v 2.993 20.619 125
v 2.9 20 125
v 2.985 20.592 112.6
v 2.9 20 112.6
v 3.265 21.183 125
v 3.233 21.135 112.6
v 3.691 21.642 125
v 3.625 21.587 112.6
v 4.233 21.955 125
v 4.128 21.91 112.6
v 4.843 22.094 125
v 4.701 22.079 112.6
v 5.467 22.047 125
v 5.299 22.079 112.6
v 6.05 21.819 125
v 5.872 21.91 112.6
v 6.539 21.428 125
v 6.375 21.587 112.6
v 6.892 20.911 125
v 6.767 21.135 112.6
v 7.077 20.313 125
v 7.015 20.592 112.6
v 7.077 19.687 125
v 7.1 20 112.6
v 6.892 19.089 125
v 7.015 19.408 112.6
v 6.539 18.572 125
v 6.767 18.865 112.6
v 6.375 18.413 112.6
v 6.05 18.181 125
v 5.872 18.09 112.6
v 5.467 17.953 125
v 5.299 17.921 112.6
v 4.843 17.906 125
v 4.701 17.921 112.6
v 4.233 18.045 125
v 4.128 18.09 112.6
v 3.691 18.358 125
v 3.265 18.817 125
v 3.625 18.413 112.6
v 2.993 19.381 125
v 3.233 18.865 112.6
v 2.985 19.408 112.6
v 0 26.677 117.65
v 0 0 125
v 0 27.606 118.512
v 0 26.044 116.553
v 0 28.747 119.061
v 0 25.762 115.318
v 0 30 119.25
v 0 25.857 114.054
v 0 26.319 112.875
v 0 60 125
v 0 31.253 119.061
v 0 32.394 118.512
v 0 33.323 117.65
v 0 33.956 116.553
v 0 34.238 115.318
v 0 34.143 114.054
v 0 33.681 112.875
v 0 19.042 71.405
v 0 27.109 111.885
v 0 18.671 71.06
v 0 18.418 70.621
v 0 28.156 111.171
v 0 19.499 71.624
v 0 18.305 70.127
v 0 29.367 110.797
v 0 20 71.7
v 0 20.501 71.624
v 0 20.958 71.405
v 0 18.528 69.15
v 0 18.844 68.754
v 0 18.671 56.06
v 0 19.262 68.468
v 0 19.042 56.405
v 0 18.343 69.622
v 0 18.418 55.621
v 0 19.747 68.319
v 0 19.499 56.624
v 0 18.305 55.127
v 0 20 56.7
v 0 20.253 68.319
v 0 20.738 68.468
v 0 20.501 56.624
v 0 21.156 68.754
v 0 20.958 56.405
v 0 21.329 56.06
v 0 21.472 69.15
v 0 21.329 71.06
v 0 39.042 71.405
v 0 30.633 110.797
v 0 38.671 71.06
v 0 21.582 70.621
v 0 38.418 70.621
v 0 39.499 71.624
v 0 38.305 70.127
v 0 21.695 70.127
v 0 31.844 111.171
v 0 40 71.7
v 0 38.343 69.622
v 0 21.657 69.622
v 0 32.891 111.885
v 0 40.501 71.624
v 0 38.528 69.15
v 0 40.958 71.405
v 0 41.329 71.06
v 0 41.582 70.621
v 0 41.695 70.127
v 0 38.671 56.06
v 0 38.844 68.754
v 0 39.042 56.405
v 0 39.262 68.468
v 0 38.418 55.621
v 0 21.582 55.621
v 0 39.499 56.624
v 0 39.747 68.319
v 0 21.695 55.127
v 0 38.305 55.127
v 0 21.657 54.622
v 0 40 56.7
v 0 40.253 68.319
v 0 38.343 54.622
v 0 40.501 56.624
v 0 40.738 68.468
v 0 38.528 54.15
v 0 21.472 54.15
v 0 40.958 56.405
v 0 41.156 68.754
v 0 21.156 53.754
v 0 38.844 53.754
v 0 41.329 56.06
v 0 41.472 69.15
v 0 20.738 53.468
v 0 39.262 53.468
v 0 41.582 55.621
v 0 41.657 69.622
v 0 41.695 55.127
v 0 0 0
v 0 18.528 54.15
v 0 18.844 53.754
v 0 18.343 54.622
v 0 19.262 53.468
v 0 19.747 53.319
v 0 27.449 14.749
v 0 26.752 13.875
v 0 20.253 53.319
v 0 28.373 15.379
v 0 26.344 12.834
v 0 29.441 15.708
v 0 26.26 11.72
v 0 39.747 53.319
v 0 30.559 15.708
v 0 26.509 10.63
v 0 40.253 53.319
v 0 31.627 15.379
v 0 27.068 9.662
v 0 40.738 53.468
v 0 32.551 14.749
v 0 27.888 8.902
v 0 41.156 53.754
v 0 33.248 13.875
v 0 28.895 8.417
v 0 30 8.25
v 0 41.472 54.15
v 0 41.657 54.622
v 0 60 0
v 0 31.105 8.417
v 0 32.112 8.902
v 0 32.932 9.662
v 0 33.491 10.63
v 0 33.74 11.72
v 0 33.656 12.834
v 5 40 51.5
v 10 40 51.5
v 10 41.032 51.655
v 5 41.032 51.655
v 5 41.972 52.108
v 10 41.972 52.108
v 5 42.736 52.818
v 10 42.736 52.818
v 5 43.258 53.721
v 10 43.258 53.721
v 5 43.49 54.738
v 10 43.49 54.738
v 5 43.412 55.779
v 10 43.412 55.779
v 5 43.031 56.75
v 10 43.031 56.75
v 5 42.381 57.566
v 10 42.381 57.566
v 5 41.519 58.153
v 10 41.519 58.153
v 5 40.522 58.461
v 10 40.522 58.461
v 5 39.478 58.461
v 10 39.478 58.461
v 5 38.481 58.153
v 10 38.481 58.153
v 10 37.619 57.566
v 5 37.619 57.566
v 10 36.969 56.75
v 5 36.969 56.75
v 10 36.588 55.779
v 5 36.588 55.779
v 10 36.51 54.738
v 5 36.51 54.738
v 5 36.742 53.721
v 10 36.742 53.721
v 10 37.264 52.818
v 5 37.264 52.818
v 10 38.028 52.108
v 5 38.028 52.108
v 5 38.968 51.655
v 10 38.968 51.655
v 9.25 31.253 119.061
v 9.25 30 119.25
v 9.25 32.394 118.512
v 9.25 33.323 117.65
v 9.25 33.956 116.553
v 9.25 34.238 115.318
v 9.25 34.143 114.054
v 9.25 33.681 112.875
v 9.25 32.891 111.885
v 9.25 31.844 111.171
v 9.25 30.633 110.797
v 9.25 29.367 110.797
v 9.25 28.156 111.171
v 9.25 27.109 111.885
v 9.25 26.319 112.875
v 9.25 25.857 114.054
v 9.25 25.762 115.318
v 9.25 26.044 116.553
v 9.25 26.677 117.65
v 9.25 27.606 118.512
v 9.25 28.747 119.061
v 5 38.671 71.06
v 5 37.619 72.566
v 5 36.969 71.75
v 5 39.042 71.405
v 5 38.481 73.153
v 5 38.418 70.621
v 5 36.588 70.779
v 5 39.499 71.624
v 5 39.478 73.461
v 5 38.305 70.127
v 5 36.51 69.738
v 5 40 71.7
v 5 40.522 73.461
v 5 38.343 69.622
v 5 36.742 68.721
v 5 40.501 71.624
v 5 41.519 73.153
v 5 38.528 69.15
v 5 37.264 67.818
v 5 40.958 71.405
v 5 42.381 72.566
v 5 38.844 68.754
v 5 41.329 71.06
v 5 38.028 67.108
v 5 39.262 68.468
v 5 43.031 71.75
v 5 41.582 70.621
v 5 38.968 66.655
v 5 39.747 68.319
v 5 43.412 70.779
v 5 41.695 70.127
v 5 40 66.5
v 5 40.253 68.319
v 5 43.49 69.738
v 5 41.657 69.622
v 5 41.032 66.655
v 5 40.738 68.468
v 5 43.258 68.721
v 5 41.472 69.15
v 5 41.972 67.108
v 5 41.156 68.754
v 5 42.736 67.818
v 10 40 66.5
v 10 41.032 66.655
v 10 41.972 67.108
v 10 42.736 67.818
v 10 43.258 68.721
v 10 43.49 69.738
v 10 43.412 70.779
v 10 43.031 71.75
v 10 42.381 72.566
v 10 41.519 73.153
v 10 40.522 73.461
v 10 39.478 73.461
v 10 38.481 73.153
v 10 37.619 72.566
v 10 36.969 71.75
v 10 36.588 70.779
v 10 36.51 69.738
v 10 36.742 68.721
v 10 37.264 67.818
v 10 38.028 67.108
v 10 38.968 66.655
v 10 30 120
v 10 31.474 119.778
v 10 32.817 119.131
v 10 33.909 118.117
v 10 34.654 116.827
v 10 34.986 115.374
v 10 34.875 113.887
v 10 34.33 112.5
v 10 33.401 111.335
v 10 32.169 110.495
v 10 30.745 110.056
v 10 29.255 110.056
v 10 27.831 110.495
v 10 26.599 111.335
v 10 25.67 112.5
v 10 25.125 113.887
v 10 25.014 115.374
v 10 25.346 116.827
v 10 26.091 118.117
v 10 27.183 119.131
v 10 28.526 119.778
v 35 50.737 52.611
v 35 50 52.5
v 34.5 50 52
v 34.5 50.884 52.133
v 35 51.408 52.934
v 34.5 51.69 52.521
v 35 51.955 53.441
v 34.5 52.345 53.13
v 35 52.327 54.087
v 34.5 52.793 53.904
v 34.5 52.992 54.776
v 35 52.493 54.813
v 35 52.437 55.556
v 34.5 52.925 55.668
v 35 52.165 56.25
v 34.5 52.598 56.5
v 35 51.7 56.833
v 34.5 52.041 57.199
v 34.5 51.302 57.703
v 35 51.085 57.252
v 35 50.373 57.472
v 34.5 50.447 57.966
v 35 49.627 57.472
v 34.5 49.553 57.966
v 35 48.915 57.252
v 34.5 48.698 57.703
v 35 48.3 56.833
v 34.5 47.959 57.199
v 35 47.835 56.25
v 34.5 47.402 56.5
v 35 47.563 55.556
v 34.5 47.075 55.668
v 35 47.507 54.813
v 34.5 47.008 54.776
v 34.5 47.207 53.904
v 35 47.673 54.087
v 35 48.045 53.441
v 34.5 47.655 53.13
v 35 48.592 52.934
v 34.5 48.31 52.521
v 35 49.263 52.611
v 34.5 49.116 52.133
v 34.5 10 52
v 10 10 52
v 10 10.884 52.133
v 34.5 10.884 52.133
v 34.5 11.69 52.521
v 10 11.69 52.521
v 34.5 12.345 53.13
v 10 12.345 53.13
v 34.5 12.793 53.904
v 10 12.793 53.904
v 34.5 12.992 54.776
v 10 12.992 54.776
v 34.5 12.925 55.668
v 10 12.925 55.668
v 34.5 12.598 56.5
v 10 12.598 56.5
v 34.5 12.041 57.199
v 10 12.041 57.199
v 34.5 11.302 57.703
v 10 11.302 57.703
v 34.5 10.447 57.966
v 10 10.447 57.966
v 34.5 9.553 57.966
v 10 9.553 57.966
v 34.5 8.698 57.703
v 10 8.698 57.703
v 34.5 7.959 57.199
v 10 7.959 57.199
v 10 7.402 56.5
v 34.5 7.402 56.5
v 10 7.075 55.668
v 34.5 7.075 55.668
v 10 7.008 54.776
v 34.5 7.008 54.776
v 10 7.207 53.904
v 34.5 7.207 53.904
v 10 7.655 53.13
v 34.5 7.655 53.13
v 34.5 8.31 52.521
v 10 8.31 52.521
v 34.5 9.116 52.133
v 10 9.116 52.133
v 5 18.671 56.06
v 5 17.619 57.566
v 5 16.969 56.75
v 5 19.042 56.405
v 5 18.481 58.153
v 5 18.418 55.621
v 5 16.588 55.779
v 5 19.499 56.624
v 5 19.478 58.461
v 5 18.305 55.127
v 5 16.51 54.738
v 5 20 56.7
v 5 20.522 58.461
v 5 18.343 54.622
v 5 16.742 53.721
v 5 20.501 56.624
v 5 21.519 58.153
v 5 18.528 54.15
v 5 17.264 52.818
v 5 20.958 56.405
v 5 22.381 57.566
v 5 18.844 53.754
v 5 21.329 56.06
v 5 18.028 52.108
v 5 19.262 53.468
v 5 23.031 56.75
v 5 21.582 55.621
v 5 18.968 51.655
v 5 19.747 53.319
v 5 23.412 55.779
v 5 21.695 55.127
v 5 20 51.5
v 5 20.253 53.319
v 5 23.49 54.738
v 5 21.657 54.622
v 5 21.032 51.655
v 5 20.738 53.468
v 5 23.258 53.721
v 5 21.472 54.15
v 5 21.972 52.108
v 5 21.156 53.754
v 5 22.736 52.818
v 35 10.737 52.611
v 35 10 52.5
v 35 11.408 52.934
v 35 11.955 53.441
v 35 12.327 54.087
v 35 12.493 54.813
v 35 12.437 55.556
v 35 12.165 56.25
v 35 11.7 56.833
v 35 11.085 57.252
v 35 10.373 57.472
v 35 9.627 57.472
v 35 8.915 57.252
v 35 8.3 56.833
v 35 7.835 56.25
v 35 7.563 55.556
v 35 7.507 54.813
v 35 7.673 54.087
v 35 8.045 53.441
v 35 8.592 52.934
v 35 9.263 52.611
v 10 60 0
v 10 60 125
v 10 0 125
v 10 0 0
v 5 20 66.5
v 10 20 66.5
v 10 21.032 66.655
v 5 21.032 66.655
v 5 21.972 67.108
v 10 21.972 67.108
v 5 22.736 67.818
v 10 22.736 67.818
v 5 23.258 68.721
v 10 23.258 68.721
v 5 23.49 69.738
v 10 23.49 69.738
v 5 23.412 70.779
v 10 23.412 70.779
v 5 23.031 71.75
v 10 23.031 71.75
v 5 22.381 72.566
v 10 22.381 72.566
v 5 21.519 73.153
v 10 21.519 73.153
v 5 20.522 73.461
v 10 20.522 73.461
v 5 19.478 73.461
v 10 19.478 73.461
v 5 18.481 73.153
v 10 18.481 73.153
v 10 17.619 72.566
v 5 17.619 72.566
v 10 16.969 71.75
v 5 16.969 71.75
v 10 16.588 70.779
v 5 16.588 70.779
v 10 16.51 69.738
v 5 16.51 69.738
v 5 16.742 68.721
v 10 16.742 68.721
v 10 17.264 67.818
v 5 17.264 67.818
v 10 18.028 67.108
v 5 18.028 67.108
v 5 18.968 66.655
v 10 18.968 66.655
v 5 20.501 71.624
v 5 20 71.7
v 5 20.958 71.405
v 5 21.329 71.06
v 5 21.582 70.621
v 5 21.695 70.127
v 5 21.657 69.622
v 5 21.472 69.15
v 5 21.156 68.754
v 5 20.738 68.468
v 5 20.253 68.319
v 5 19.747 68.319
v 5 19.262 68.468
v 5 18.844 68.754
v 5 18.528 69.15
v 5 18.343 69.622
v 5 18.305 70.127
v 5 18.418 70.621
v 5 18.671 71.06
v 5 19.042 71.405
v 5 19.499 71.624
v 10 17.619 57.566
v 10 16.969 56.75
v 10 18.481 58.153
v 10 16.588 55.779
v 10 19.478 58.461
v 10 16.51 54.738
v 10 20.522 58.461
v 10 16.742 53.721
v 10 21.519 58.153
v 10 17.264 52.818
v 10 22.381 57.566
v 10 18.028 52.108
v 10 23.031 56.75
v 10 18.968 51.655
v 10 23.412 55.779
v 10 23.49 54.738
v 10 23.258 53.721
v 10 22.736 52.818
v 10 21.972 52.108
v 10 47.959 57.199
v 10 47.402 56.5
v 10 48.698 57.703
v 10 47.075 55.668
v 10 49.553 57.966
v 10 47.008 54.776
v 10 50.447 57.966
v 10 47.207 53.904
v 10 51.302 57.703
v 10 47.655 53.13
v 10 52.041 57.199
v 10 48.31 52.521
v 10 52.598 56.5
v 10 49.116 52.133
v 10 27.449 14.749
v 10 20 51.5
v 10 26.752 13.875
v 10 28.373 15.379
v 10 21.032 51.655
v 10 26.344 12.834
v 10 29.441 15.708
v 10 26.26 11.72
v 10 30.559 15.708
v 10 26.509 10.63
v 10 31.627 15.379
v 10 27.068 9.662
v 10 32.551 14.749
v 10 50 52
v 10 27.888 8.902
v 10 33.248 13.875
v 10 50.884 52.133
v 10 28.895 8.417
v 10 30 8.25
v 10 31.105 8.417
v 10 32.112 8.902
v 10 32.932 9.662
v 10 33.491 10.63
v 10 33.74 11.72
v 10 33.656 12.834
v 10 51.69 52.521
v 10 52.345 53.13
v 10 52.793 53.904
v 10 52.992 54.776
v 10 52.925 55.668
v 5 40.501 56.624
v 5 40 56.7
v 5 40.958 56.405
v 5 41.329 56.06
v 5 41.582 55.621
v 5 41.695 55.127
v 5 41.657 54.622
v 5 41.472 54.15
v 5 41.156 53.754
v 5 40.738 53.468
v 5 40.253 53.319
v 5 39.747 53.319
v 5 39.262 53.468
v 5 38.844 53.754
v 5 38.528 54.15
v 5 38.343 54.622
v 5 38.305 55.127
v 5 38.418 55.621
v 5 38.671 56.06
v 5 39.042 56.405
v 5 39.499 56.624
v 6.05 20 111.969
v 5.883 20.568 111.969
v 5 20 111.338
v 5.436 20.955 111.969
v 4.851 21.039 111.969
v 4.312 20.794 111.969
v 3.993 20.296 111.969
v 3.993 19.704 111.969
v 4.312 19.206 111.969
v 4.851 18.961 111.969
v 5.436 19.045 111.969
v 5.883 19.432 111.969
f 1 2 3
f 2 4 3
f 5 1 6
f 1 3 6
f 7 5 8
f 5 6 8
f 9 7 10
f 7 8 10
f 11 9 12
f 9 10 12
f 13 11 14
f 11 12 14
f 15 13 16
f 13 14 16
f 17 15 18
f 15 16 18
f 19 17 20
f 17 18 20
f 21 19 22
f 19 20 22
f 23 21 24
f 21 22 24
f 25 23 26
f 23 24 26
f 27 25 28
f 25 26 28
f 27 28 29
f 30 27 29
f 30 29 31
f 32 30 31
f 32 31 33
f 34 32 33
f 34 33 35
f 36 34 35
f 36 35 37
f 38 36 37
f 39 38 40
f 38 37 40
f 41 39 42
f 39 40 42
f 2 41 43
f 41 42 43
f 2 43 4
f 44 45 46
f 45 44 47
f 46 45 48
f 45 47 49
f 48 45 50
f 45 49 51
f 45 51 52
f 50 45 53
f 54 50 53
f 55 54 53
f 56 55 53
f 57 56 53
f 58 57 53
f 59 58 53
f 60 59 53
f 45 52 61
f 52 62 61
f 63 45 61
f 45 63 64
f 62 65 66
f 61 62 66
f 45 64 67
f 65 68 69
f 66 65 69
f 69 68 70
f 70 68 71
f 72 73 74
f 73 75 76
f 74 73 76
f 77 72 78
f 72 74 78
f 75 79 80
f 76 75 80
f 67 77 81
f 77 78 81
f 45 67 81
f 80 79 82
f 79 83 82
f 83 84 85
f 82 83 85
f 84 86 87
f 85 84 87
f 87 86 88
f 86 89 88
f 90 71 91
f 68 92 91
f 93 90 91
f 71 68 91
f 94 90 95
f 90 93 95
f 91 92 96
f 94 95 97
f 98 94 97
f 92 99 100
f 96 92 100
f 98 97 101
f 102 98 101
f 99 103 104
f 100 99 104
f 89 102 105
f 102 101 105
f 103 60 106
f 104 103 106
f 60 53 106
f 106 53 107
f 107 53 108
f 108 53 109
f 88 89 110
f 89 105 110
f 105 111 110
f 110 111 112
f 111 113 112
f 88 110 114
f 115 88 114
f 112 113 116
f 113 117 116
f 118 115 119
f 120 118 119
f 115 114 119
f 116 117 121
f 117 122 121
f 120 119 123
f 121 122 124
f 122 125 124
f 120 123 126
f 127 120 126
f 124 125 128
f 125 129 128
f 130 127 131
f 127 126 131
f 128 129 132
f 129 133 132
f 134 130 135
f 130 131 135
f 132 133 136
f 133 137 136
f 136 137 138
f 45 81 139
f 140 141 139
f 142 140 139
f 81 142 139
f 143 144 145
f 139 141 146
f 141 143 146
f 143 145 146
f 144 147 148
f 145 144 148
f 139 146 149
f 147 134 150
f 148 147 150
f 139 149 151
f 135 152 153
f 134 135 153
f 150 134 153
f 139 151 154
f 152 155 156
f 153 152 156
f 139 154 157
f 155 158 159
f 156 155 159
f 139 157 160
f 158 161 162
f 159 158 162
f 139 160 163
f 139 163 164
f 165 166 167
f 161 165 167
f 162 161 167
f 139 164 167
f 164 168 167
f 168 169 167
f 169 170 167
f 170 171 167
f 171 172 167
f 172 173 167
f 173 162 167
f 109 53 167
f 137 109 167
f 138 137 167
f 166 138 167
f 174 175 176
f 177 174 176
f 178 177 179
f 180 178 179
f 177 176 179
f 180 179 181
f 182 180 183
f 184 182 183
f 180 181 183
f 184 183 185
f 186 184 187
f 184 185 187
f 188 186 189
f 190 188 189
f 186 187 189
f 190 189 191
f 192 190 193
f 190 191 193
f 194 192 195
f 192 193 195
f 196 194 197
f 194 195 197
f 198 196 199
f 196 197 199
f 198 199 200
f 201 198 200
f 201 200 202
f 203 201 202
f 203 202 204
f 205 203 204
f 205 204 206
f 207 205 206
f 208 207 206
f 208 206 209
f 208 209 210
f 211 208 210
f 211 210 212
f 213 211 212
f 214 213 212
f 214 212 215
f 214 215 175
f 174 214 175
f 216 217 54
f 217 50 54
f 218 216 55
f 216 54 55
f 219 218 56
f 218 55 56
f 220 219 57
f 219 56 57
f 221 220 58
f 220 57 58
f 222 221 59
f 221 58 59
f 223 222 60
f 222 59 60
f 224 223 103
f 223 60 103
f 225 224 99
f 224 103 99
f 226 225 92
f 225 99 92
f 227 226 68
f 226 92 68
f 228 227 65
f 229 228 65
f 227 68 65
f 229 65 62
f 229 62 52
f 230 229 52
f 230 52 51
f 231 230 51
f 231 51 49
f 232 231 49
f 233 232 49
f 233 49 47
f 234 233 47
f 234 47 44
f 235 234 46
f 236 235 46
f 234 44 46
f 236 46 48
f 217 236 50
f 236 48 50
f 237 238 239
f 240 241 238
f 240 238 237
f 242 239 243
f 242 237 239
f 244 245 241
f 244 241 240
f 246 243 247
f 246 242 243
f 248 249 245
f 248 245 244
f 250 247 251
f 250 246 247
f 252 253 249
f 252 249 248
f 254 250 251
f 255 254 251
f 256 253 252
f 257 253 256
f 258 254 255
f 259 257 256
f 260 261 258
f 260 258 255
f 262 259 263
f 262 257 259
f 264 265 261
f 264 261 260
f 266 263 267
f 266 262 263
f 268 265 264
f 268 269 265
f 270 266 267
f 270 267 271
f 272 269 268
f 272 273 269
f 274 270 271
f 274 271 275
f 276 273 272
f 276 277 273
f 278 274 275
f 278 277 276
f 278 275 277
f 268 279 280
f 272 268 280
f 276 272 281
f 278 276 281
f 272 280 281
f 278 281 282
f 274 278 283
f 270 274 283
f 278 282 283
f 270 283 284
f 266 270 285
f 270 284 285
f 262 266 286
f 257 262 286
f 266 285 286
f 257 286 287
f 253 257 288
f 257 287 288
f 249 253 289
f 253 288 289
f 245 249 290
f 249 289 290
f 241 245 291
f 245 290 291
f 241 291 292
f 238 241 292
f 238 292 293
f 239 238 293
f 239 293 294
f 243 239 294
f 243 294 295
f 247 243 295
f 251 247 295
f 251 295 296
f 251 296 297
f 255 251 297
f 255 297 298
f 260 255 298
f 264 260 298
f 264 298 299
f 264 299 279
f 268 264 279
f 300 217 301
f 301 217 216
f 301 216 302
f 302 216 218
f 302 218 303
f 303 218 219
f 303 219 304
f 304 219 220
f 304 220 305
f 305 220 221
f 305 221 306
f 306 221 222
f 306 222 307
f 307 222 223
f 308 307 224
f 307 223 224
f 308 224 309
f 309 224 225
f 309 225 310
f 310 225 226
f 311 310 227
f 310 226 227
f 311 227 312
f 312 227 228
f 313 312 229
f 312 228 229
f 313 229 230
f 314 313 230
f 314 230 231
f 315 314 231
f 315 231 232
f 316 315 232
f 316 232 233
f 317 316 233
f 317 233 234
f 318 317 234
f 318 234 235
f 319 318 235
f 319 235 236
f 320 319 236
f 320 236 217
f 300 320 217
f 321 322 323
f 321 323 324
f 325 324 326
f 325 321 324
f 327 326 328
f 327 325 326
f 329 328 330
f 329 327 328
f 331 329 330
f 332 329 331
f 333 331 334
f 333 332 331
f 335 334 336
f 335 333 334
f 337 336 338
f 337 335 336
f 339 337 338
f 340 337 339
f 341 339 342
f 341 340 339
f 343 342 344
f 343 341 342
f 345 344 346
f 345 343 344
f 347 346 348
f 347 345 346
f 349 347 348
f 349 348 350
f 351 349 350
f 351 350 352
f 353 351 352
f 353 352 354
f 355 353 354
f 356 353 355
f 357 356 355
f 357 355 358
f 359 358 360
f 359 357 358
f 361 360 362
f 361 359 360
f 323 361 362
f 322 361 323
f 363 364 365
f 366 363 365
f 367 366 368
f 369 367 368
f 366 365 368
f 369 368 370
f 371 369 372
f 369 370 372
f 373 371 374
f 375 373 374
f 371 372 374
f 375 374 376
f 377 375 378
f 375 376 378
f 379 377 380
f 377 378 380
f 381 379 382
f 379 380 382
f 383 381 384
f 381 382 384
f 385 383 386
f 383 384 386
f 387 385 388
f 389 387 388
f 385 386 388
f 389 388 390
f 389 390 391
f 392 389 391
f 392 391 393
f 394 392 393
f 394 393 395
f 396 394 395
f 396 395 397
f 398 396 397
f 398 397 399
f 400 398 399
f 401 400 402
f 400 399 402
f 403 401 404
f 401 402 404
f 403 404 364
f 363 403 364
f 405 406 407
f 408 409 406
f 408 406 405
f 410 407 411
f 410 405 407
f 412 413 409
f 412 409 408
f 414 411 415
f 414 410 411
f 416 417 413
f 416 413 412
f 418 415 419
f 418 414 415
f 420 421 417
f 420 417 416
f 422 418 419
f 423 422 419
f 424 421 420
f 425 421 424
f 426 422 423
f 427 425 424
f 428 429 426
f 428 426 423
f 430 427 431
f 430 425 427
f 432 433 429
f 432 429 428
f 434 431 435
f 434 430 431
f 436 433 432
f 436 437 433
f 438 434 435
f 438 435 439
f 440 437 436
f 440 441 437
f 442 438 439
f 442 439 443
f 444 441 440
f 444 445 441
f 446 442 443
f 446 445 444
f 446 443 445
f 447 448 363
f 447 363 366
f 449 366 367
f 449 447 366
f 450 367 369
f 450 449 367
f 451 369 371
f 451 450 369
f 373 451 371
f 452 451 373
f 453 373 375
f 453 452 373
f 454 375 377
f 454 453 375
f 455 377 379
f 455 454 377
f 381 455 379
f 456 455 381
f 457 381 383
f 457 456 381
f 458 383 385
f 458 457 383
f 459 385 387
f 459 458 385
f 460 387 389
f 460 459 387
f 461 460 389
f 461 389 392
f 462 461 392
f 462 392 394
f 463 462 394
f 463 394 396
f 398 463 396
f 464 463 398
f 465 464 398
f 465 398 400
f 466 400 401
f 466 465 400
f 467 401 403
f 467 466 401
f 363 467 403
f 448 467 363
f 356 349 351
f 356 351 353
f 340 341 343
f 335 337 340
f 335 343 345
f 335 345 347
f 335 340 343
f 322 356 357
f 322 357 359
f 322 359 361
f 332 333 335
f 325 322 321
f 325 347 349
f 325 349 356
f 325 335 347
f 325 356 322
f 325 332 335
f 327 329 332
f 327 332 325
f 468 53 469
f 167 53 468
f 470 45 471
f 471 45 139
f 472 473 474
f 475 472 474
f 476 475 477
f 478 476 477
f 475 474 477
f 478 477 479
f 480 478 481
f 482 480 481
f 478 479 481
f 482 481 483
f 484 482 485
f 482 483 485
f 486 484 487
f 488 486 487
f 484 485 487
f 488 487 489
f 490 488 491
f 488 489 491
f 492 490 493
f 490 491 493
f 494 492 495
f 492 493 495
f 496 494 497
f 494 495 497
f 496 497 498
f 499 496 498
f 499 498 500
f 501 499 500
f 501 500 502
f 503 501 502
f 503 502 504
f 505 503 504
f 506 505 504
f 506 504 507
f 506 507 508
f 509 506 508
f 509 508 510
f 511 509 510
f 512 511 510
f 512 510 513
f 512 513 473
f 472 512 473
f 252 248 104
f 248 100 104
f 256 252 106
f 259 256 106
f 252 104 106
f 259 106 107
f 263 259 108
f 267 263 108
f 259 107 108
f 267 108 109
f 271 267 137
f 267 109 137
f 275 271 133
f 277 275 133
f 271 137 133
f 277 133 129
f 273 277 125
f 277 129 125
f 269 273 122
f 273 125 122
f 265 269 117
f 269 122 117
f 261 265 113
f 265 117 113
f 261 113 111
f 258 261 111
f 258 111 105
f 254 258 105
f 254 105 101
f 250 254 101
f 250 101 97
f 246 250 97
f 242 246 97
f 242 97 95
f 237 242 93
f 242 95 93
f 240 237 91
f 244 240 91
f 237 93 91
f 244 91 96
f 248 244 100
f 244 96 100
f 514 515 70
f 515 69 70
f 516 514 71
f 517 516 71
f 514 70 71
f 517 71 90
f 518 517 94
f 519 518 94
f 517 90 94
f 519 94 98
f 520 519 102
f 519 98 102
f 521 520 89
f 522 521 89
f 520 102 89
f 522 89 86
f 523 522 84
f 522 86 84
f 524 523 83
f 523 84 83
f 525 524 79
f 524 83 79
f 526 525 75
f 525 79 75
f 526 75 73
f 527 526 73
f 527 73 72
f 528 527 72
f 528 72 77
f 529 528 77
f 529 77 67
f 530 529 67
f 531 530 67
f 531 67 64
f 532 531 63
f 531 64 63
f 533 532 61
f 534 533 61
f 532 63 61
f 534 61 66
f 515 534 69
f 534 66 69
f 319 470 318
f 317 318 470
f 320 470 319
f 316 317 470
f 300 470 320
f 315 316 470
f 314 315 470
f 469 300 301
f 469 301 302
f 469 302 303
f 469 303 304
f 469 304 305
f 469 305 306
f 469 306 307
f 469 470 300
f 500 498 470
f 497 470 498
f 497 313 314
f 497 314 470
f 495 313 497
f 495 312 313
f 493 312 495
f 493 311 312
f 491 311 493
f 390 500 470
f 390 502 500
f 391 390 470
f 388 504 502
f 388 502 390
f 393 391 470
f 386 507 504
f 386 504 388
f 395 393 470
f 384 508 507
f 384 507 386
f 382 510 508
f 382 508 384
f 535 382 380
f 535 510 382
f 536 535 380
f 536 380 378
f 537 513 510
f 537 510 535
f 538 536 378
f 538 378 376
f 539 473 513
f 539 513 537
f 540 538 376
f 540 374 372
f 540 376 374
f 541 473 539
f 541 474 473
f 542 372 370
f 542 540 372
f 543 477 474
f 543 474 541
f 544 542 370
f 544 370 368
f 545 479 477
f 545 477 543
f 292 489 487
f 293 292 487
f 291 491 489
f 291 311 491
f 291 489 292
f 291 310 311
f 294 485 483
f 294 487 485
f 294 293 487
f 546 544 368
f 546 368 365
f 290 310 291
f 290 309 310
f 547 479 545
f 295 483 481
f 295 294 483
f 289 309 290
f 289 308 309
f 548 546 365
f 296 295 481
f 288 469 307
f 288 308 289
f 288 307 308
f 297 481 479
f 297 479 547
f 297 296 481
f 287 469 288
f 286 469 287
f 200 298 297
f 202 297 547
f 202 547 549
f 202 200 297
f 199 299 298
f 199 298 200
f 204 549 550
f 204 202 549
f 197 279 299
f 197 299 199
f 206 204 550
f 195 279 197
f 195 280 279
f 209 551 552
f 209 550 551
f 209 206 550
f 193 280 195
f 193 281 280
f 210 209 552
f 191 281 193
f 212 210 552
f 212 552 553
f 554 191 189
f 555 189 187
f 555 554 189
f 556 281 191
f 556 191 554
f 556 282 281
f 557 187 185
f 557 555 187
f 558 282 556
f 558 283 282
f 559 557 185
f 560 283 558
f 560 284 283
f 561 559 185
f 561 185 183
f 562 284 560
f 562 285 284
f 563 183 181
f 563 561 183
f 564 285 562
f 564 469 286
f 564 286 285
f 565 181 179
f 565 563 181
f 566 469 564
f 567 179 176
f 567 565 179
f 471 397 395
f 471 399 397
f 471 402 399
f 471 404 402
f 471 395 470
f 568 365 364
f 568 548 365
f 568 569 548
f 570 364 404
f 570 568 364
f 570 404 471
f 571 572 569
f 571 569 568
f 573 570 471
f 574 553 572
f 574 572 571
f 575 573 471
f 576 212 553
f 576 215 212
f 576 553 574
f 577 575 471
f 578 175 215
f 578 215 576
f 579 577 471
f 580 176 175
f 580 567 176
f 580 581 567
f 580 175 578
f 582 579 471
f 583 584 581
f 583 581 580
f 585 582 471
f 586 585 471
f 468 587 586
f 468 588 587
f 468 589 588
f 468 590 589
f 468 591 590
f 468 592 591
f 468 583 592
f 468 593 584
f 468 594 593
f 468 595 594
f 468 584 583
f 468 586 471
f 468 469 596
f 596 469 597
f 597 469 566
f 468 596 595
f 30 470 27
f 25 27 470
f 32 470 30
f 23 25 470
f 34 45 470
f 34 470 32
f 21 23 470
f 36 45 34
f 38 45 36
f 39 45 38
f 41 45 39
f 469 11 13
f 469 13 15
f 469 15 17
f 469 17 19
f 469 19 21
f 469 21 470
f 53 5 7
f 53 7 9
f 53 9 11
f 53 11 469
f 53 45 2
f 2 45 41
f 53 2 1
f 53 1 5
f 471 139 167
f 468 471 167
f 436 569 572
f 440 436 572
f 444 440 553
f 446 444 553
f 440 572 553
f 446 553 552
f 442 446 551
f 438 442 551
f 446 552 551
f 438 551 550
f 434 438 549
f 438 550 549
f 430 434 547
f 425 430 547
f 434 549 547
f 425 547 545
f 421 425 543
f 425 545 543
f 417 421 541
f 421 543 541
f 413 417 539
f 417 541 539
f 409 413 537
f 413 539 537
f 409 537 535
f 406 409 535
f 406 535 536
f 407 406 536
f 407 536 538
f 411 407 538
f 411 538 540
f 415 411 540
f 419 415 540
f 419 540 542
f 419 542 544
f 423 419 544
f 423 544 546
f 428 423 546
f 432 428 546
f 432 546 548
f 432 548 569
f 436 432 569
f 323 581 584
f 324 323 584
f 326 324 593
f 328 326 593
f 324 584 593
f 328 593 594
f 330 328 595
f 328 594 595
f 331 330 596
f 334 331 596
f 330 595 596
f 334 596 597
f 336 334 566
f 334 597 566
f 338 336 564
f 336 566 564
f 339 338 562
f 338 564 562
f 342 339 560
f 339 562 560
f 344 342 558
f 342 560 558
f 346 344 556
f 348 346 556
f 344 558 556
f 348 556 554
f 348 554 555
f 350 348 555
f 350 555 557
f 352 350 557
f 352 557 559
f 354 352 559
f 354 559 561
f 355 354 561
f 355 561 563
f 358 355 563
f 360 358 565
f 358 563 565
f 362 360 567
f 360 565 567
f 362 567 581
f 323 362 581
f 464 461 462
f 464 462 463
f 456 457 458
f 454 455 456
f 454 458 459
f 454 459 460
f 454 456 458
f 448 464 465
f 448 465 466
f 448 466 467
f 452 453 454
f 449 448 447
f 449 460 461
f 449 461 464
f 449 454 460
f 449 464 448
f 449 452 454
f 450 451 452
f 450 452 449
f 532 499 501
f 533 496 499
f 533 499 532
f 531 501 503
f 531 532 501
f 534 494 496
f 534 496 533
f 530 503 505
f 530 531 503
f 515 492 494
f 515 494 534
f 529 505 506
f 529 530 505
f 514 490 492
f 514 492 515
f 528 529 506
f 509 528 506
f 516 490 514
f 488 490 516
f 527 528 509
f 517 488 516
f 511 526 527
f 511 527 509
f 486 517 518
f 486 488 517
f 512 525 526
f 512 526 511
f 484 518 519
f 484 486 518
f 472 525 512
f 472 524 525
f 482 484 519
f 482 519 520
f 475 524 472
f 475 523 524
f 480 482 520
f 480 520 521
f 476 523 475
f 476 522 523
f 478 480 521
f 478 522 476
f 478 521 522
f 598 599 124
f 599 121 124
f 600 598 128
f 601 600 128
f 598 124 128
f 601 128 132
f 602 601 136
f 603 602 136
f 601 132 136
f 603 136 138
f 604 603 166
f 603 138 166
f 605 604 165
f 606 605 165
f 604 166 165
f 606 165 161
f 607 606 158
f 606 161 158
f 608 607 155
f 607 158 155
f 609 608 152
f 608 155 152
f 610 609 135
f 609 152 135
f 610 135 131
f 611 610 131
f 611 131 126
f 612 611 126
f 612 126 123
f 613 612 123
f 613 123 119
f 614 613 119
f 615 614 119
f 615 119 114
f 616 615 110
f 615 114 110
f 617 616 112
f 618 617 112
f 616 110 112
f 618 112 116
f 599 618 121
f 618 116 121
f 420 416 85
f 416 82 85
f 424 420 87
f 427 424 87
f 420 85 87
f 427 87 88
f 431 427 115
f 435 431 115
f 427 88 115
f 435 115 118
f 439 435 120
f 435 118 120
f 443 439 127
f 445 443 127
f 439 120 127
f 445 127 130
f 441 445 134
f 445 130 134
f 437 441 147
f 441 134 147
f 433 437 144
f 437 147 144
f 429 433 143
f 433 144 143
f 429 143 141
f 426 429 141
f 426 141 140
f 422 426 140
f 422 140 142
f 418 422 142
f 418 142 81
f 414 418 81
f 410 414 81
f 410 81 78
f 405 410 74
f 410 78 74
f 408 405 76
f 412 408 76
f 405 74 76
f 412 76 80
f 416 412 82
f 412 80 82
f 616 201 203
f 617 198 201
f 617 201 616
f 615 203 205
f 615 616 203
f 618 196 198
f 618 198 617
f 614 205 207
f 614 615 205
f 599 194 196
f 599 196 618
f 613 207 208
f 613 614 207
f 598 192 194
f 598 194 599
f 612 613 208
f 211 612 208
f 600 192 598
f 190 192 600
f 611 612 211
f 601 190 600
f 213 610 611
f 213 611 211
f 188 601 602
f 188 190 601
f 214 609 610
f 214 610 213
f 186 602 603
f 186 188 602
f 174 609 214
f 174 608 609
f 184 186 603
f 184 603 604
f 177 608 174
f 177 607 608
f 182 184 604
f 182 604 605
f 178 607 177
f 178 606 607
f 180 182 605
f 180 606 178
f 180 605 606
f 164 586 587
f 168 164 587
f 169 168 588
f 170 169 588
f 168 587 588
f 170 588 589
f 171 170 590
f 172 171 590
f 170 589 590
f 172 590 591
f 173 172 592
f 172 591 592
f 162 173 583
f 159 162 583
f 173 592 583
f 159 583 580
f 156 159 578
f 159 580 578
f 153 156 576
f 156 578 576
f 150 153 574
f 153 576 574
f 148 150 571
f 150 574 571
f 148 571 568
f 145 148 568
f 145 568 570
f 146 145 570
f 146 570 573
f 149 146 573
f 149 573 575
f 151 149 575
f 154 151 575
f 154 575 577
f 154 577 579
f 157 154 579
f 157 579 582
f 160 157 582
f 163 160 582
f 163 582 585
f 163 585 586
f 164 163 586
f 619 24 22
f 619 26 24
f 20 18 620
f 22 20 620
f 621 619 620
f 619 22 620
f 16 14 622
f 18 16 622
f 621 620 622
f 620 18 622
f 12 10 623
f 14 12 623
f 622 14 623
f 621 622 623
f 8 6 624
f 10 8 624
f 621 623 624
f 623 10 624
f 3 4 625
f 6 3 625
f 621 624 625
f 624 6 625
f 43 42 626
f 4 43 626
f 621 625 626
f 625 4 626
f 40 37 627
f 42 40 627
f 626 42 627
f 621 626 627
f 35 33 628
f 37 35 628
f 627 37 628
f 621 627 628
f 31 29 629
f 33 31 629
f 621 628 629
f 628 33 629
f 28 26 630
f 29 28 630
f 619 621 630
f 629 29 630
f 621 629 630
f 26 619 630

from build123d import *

# Parameters (mm, degrees)
SKETCH1_W                                           = 125
SKETCH1_H                                           = 60
BOSS_EXTRUDE1_DEPTH                                 = 10
SKETCH12_R                                          = 3
BOSS_EXTRUDE2_DEPTH                                 = 25
M10_TAPPED_HOLE1_D                                  = 8.5
M10_TAPPED_HOLE1_DEPTH                              = 24.5
M10_TAPPED_HOLE1_CSINK_D                            = 10
M10_TAPPED_HOLE1_CSINK_ANGLE                        = 90
M10_TAPPED_HOLE1_TIP                                = 2.553657631
SKETCH7_R                                           = 3.75
CUT_EXTRUDE1_DEPTH                                  = 141.890028036
CBORE_FOR_M3_HEX_SOCKET_HEAD_CAP_SCREW1_D           = 3.4
CBORE_FOR_M3_HEX_SOCKET_HEAD_CAP_SCREW1_CBORE_D     = 7
CBORE_FOR_M3_HEX_SOCKET_HEAD_CAP_SCREW1_CBORE_DEPTH = 5
M5_TAPPED_HOLE1_D                                   = 4.2
M5_TAPPED_HOLE1_DEPTH                               = 12.4
M5_TAPPED_HOLE1_TIP                                 = 1.2618073
CHAMFER2_SIZE                                       = 0.5


with BuildPart() as part:
    # Sketch1 → Boss-Extrude1 (new body)
    with BuildSketch(Plane(origin=(0, 0, 0), x_dir=(0, 0, -1), z_dir=(1, 0, 0))):
        with Locations((-62.5, 30)):
            Rectangle(SKETCH1_W, SKETCH1_H)
    extrude(amount=BOSS_EXTRUDE1_DEPTH)

    # Sketch12 → Boss-Extrude2 (add)
    with BuildSketch(Plane(origin=(10, 0, 0), x_dir=(0, 0, -1), z_dir=(1, 0, 0))):
        with Locations((-55, 10)):
            Circle(SKETCH12_R)
        with Locations((-55, 50)):
            Circle(SKETCH12_R)
    extrude(amount=BOSS_EXTRUDE2_DEPTH)

    # M10 Tapped Hole1
    with Locations(Plane(origin=(10, 0, 0), x_dir=(0, 0, -1), z_dir=(1, 0, 0))):
        with Locations((-115, 30)):
            CounterSinkHole(M10_TAPPED_HOLE1_D / 2, M10_TAPPED_HOLE1_CSINK_D / 2, depth=M10_TAPPED_HOLE1_DEPTH, counter_sink_angle=M10_TAPPED_HOLE1_CSINK_ANGLE)
            with Locations((0, 0, -(M10_TAPPED_HOLE1_DEPTH + M10_TAPPED_HOLE1_TIP / 2))):  # 118° drill point
                Cone(0, M10_TAPPED_HOLE1_D / 2, M10_TAPPED_HOLE1_TIP, mode=Mode.SUBTRACT)

    # Sketch7 → Cut-Extrude1 (cut, through all)
    with BuildSketch(Plane(origin=(10, 0, 0), x_dir=(0, 0, -1), z_dir=(1, 0, 0))):
        with Locations((-12, 30)):
            Circle(SKETCH7_R)
    extrude(amount=-CUT_EXTRUDE1_DEPTH, mode=Mode.SUBTRACT)

    # CBORE for M3 Hex Socket Head Cap Screw1 (through all)
    with Locations(Plane(origin=(10, 0, 0), x_dir=(0, 0, -1), z_dir=(1, 0, 0))):
        with Locations((-70, 20), (-55, 20), (-55, 40), (-70, 40)):
            CounterBoreHole(CBORE_FOR_M3_HEX_SOCKET_HEAD_CAP_SCREW1_D / 2, CBORE_FOR_M3_HEX_SOCKET_HEAD_CAP_SCREW1_CBORE_D / 2, CBORE_FOR_M3_HEX_SOCKET_HEAD_CAP_SCREW1_CBORE_DEPTH)

    # M5 Tapped Hole1
    with Locations(Plane.XY.offset(125)):
        with Locations((5, 20)):
            Hole(M5_TAPPED_HOLE1_D / 2, depth=M5_TAPPED_HOLE1_DEPTH)
            with Locations((0, 0, -(M5_TAPPED_HOLE1_DEPTH + M5_TAPPED_HOLE1_TIP / 2))):  # 118° drill point
                Cone(0, M5_TAPPED_HOLE1_D / 2, M5_TAPPED_HOLE1_TIP, mode=Mode.SUBTRACT)

    # Chamfer2
    chamfer2_edges = [part.edges().sort_by_distance(p)[0] for p in [
        (35, 10, 58),
        (35, 50, 58),
    ]]
    chamfer(chamfer2_edges, length=CHAMFER2_SIZE)


solid = part.part
